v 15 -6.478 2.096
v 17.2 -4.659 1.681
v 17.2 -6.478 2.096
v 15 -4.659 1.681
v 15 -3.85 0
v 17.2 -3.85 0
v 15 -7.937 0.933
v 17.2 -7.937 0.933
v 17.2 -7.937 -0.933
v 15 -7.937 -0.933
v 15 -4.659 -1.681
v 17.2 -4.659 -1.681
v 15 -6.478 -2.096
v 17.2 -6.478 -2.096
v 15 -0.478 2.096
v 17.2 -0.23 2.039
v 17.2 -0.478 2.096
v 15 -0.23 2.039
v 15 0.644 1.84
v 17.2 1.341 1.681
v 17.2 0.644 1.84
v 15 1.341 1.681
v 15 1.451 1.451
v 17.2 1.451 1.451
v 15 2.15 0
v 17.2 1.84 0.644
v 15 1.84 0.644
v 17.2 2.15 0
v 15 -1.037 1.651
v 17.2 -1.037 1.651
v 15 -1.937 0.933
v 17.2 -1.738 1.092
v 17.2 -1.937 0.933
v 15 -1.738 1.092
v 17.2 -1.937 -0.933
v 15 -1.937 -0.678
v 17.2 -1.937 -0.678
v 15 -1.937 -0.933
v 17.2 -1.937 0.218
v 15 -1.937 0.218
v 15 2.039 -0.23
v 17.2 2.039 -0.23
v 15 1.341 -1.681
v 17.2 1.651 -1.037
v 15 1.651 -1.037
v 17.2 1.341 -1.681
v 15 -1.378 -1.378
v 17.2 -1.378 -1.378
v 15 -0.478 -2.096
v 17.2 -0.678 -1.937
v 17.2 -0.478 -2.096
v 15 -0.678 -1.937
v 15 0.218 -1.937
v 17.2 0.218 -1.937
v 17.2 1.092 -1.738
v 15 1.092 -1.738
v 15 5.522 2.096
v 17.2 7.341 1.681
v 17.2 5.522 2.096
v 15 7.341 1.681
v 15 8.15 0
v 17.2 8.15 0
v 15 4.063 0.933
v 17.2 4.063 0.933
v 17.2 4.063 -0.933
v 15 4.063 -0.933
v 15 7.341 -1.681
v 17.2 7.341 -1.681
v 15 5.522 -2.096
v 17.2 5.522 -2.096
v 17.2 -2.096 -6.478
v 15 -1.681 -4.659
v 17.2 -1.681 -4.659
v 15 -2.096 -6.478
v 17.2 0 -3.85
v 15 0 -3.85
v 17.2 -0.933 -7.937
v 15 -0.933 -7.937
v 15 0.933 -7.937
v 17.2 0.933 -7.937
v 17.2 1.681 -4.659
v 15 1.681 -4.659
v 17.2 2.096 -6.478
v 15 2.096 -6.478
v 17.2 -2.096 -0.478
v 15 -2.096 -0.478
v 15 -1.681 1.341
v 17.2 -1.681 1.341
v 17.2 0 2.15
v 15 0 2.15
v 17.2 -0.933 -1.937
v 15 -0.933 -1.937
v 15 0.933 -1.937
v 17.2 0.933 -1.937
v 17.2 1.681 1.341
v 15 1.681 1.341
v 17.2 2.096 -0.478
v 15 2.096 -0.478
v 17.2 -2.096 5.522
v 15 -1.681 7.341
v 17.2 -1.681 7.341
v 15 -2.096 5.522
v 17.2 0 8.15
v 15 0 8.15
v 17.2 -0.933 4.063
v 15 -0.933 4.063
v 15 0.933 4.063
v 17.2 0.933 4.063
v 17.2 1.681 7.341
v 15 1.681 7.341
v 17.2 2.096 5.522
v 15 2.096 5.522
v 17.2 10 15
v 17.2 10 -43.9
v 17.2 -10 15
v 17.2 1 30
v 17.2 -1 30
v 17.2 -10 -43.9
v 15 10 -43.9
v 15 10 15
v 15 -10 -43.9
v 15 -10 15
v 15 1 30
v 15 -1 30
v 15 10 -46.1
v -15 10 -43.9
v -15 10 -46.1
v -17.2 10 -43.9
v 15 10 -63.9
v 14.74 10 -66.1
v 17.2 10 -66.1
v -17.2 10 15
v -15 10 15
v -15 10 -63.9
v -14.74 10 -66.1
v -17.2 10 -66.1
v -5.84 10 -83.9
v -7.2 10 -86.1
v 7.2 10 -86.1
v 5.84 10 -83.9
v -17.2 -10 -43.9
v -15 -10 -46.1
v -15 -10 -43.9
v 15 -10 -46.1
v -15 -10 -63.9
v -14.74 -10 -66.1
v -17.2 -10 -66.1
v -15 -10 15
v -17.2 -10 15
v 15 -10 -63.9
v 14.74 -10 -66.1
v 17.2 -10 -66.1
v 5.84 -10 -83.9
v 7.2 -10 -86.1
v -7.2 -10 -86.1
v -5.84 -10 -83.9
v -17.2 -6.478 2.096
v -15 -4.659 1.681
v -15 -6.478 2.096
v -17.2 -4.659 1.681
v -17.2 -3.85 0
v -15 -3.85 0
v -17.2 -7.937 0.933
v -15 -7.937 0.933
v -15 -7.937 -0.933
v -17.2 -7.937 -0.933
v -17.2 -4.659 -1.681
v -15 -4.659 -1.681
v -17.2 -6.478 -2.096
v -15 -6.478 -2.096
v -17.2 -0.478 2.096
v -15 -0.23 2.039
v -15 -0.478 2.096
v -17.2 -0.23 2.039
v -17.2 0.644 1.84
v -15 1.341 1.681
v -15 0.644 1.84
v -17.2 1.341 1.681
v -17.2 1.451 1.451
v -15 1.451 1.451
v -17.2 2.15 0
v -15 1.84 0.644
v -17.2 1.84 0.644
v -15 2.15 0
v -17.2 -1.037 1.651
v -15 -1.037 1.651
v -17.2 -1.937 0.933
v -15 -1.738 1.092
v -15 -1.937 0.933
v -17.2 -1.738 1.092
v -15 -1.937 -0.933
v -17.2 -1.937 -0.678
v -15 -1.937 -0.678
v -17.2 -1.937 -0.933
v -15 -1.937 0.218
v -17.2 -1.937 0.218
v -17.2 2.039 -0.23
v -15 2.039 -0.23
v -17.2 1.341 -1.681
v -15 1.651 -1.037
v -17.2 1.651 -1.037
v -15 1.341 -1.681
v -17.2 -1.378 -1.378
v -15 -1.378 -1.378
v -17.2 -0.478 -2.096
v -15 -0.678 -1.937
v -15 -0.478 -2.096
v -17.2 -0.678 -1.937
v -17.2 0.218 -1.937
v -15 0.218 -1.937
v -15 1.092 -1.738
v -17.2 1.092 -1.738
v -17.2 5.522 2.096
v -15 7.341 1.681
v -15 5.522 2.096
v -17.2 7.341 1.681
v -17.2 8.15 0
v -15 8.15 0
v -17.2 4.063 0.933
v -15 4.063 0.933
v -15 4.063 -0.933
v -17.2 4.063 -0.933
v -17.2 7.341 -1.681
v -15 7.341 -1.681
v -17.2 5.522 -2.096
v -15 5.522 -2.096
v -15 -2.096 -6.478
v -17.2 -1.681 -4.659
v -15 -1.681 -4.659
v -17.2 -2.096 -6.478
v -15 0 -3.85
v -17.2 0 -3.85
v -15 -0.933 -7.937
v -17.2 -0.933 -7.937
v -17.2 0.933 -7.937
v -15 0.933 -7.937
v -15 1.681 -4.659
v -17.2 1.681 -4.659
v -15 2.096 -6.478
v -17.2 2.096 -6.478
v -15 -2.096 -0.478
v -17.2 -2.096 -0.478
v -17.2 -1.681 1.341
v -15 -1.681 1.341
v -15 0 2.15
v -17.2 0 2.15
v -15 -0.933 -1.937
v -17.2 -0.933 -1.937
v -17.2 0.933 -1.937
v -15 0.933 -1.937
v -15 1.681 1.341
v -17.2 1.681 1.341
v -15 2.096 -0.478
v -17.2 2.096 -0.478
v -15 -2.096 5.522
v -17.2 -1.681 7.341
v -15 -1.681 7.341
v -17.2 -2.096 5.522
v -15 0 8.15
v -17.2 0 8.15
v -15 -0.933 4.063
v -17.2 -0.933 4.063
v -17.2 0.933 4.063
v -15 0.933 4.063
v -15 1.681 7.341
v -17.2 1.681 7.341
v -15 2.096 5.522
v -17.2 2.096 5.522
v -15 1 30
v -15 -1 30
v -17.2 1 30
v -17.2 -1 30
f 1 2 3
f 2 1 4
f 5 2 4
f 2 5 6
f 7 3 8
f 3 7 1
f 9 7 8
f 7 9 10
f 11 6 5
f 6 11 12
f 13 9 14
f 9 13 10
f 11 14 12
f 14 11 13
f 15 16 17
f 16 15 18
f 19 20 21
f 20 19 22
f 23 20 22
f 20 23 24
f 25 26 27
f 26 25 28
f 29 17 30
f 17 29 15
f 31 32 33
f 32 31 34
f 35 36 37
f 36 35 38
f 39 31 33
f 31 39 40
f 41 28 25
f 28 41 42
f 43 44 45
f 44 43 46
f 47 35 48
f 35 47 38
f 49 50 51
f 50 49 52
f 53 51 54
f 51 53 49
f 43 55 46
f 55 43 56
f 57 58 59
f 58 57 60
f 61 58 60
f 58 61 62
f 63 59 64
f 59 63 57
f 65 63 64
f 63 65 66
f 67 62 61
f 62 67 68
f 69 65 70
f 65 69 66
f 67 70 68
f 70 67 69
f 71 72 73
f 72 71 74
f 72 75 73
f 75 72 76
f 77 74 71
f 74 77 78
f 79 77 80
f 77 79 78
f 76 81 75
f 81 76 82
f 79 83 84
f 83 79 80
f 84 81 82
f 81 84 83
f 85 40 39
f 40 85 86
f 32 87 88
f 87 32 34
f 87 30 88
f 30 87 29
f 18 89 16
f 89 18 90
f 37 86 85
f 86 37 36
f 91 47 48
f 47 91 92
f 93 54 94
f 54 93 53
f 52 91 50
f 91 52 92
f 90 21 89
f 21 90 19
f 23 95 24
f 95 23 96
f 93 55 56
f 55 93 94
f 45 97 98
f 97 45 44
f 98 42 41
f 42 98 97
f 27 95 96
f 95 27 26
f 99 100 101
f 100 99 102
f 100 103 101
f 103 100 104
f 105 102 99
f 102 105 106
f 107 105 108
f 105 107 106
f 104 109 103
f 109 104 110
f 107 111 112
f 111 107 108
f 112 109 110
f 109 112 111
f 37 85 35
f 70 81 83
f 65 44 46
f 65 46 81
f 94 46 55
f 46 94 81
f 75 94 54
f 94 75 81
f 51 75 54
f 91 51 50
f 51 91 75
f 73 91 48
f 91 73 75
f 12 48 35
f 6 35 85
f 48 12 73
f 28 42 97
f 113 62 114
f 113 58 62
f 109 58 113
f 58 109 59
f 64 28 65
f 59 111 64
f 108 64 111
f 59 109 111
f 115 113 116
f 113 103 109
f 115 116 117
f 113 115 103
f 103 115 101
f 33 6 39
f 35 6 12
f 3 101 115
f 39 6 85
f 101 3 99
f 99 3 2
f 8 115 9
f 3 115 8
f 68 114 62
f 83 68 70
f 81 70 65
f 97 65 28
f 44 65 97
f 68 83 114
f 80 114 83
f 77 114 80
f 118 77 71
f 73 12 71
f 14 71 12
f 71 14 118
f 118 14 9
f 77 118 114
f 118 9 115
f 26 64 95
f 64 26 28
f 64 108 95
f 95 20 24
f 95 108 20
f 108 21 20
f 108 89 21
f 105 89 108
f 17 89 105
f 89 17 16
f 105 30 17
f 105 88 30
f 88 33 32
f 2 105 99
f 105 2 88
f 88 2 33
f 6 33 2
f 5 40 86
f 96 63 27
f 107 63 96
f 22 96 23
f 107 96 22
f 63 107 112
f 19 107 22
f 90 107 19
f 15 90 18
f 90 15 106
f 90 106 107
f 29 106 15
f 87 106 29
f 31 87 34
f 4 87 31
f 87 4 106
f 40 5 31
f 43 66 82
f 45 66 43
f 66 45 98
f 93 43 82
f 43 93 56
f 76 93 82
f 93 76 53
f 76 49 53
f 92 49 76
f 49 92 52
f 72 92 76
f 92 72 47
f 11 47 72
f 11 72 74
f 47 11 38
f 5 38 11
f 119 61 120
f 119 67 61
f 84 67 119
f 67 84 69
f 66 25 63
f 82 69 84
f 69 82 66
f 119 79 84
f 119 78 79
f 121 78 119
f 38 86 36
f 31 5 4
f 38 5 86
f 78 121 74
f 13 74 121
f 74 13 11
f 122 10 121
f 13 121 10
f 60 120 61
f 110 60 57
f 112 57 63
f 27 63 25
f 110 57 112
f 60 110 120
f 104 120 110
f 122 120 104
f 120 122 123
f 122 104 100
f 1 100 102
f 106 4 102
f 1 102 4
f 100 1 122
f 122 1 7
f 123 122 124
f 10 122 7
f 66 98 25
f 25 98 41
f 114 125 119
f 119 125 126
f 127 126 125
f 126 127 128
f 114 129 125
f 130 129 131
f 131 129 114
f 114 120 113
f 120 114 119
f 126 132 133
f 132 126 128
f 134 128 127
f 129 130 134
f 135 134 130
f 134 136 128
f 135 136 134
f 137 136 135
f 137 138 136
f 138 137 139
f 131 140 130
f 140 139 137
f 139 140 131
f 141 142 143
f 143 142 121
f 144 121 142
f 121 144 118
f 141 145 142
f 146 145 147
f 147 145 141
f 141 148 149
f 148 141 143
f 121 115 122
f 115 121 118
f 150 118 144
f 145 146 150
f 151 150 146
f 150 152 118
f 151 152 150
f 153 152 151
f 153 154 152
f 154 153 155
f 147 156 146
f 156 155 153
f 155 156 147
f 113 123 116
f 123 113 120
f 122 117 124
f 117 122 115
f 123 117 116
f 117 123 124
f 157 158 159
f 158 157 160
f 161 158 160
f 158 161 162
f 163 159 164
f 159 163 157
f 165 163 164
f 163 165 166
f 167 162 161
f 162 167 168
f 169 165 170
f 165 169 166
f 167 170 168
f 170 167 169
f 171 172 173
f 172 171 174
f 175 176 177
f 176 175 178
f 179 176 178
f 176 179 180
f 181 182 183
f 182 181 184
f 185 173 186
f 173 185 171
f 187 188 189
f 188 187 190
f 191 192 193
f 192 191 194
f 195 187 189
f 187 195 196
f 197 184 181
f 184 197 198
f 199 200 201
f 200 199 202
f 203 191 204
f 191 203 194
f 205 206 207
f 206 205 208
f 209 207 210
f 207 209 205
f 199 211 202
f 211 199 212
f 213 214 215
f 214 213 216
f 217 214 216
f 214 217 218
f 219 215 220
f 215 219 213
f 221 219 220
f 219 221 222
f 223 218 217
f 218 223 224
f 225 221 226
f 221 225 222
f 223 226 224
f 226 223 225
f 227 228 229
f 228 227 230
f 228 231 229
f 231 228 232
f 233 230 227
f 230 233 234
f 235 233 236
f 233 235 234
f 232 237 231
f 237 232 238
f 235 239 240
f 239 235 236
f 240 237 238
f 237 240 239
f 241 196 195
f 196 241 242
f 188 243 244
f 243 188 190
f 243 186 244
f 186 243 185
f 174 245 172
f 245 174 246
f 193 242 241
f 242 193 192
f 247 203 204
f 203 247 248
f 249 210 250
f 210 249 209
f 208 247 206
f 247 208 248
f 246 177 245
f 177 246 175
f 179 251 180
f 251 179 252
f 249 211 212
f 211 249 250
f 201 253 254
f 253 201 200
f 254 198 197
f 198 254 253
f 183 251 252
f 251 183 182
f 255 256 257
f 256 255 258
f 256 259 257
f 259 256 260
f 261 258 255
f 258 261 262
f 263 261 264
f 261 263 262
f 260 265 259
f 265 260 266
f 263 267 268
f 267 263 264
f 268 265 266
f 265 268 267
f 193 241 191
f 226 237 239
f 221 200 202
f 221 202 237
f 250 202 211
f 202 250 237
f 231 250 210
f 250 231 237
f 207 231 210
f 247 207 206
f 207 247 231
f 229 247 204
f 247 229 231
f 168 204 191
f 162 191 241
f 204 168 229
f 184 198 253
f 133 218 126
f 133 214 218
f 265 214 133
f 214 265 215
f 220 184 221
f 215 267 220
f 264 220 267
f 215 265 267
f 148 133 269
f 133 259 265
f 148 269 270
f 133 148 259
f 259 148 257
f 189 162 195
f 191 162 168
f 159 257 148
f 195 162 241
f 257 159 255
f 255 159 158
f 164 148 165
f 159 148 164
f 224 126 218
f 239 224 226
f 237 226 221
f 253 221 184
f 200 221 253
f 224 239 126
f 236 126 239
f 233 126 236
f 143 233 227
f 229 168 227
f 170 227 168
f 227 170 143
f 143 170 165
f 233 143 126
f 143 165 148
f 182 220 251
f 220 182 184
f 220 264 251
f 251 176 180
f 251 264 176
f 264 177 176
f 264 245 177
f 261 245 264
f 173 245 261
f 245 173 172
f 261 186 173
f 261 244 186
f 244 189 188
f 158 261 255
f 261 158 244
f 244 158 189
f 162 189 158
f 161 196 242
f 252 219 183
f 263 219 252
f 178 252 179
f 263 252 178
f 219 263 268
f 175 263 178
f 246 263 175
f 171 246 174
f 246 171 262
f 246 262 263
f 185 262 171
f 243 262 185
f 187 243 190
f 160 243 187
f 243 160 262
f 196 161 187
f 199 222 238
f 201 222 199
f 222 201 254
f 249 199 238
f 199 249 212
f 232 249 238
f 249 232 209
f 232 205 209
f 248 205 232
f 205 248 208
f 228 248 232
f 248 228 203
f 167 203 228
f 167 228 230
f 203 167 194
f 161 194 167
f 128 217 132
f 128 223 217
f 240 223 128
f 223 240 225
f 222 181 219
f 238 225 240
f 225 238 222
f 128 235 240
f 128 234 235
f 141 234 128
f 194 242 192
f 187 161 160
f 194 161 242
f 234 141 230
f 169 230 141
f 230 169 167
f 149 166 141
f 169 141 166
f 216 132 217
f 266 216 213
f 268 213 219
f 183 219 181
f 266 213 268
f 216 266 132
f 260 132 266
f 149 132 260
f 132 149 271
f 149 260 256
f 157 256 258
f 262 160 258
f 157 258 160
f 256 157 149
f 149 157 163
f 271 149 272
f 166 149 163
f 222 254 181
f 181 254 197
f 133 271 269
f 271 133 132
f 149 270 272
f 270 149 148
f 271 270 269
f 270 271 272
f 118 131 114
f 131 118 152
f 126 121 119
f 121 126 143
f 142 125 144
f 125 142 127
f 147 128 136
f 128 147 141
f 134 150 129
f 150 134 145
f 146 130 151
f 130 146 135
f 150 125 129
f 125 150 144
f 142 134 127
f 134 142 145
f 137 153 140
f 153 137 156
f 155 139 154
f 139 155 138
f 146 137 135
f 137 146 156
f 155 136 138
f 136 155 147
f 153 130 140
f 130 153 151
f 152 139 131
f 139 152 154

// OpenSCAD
// file: ../util/rounded.scad
// Do a rounded cube
module rounded(x=10, y=10, z=10, r=3, center=false) {
  if (center) {
    translate([-(x/2),-(y/2),0])
      rounded(x, y, z, r);
  } else {
    translate([r,r,0])
    minkowski() {
      cube([x-2*r,y-2*r,z/2]);
      cylinder(h=z/2, r=r);
    }
  }
}
// file: ../models/ollo.scad
// Diameter of plastic ollo holes
OlloHoles = 4.3;

// Width of Ollo "real" plastic
OlloWidth = 3;

// Distance between two ollo holes
OlloSpacing = 6;

// Do an Ollo hole on the part
module olloHole(depth=2.2)
{
    translate([0,0,-0.1])
      cylinder(depth+0.2, OlloHoles/2, OlloHoles/2);
}

// Do 3 ollo holes
module threeOllo(depth=2.2)
{
  for (xy=[[-OlloSpacing,0],[0,0],[OlloSpacing,0]]) {
    translate([xy[0], xy[1], 0])
    olloHole(depth);
  }
}

// Do a servo arm holes
module servoArm(depth=2.2)
{
    threeOllo(depth);
    rotate([0,0,90])
      threeOllo(depth);
}
// main file
use <../models/ollo.scad>;
use <../util/rounded.scad>;

module leg(sizeA=60, sizeB=20, sizeC=20, sizeBottom=10,
        sizeTop=15, thickness=2.2, print=false)
{
    xOffset = 0;
    spacing = 30;

    module legSide()
    {
        difference() {
            union() {
                translate([0,0,sizeA/2])
                    rotate([0,90,0]) {
                        cube([sizeA, 20, thickness], center=true);
                    }
            }
            translate([-thickness, 0, sizeA-15]) {
                rotate([90,0,90]) {
                    servoArm(2*thickness);
                }
            }
        }
        translate([-thickness/2,0,sizeA]) {
            rotate([90,0,90])
                linear_extrude(thickness)
                polygon([[-10,0],[-1,sizeTop],[1,sizeTop],[10,0]]);
        }
    }

    module biais() {
        Dx = (spacing-sizeBottom)/2;
        Dy = sizeC;
        Dl = sqrt(pow(Dx,2)+pow(Dy,2));

        translate([-(spacing/2)-thickness,-10,-(sizeB+thickness/2)])
            rotate([0,atan2(Dy,Dx),0])
            cube([Dl,20,thickness]);
    }

    if (print) {
        translate([0,0,10-xOffset])
            rotate([90,0,0])
            leg(sizeA, sizeB, sizeC, sizeBottom,
                    sizeTop, thickness, false);
    } else {
        echo("[PART] leg");
        translate([0,xOffset,-sizeA+15]) {
            cube([spacing+thickness*2, 20, thickness], center=true);

            translate([spacing/2+thickness/2,0,0])
                legSide();
            translate([-(spacing/2+thickness/2),0,0])
                legSide();

            translate([0,0,-sizeB])
                cube([spacing+thickness*2, 20, thickness], center=true);
            translate([spacing/2+thickness/2,0,-sizeB/2])
                cube([thickness,20,sizeB], center=true);
            translate([-(spacing/2+thickness/2),0,-sizeB/2])
                cube([thickness,20,sizeB], center=true);

            translate([0,0,-(sizeB+sizeC)])
                cube([sizeBottom+thickness*2, 20, thickness], center=true);

            biais();
            mirror([1,0,0]) {
                biais();
            }
        }
    }
}

leg();
